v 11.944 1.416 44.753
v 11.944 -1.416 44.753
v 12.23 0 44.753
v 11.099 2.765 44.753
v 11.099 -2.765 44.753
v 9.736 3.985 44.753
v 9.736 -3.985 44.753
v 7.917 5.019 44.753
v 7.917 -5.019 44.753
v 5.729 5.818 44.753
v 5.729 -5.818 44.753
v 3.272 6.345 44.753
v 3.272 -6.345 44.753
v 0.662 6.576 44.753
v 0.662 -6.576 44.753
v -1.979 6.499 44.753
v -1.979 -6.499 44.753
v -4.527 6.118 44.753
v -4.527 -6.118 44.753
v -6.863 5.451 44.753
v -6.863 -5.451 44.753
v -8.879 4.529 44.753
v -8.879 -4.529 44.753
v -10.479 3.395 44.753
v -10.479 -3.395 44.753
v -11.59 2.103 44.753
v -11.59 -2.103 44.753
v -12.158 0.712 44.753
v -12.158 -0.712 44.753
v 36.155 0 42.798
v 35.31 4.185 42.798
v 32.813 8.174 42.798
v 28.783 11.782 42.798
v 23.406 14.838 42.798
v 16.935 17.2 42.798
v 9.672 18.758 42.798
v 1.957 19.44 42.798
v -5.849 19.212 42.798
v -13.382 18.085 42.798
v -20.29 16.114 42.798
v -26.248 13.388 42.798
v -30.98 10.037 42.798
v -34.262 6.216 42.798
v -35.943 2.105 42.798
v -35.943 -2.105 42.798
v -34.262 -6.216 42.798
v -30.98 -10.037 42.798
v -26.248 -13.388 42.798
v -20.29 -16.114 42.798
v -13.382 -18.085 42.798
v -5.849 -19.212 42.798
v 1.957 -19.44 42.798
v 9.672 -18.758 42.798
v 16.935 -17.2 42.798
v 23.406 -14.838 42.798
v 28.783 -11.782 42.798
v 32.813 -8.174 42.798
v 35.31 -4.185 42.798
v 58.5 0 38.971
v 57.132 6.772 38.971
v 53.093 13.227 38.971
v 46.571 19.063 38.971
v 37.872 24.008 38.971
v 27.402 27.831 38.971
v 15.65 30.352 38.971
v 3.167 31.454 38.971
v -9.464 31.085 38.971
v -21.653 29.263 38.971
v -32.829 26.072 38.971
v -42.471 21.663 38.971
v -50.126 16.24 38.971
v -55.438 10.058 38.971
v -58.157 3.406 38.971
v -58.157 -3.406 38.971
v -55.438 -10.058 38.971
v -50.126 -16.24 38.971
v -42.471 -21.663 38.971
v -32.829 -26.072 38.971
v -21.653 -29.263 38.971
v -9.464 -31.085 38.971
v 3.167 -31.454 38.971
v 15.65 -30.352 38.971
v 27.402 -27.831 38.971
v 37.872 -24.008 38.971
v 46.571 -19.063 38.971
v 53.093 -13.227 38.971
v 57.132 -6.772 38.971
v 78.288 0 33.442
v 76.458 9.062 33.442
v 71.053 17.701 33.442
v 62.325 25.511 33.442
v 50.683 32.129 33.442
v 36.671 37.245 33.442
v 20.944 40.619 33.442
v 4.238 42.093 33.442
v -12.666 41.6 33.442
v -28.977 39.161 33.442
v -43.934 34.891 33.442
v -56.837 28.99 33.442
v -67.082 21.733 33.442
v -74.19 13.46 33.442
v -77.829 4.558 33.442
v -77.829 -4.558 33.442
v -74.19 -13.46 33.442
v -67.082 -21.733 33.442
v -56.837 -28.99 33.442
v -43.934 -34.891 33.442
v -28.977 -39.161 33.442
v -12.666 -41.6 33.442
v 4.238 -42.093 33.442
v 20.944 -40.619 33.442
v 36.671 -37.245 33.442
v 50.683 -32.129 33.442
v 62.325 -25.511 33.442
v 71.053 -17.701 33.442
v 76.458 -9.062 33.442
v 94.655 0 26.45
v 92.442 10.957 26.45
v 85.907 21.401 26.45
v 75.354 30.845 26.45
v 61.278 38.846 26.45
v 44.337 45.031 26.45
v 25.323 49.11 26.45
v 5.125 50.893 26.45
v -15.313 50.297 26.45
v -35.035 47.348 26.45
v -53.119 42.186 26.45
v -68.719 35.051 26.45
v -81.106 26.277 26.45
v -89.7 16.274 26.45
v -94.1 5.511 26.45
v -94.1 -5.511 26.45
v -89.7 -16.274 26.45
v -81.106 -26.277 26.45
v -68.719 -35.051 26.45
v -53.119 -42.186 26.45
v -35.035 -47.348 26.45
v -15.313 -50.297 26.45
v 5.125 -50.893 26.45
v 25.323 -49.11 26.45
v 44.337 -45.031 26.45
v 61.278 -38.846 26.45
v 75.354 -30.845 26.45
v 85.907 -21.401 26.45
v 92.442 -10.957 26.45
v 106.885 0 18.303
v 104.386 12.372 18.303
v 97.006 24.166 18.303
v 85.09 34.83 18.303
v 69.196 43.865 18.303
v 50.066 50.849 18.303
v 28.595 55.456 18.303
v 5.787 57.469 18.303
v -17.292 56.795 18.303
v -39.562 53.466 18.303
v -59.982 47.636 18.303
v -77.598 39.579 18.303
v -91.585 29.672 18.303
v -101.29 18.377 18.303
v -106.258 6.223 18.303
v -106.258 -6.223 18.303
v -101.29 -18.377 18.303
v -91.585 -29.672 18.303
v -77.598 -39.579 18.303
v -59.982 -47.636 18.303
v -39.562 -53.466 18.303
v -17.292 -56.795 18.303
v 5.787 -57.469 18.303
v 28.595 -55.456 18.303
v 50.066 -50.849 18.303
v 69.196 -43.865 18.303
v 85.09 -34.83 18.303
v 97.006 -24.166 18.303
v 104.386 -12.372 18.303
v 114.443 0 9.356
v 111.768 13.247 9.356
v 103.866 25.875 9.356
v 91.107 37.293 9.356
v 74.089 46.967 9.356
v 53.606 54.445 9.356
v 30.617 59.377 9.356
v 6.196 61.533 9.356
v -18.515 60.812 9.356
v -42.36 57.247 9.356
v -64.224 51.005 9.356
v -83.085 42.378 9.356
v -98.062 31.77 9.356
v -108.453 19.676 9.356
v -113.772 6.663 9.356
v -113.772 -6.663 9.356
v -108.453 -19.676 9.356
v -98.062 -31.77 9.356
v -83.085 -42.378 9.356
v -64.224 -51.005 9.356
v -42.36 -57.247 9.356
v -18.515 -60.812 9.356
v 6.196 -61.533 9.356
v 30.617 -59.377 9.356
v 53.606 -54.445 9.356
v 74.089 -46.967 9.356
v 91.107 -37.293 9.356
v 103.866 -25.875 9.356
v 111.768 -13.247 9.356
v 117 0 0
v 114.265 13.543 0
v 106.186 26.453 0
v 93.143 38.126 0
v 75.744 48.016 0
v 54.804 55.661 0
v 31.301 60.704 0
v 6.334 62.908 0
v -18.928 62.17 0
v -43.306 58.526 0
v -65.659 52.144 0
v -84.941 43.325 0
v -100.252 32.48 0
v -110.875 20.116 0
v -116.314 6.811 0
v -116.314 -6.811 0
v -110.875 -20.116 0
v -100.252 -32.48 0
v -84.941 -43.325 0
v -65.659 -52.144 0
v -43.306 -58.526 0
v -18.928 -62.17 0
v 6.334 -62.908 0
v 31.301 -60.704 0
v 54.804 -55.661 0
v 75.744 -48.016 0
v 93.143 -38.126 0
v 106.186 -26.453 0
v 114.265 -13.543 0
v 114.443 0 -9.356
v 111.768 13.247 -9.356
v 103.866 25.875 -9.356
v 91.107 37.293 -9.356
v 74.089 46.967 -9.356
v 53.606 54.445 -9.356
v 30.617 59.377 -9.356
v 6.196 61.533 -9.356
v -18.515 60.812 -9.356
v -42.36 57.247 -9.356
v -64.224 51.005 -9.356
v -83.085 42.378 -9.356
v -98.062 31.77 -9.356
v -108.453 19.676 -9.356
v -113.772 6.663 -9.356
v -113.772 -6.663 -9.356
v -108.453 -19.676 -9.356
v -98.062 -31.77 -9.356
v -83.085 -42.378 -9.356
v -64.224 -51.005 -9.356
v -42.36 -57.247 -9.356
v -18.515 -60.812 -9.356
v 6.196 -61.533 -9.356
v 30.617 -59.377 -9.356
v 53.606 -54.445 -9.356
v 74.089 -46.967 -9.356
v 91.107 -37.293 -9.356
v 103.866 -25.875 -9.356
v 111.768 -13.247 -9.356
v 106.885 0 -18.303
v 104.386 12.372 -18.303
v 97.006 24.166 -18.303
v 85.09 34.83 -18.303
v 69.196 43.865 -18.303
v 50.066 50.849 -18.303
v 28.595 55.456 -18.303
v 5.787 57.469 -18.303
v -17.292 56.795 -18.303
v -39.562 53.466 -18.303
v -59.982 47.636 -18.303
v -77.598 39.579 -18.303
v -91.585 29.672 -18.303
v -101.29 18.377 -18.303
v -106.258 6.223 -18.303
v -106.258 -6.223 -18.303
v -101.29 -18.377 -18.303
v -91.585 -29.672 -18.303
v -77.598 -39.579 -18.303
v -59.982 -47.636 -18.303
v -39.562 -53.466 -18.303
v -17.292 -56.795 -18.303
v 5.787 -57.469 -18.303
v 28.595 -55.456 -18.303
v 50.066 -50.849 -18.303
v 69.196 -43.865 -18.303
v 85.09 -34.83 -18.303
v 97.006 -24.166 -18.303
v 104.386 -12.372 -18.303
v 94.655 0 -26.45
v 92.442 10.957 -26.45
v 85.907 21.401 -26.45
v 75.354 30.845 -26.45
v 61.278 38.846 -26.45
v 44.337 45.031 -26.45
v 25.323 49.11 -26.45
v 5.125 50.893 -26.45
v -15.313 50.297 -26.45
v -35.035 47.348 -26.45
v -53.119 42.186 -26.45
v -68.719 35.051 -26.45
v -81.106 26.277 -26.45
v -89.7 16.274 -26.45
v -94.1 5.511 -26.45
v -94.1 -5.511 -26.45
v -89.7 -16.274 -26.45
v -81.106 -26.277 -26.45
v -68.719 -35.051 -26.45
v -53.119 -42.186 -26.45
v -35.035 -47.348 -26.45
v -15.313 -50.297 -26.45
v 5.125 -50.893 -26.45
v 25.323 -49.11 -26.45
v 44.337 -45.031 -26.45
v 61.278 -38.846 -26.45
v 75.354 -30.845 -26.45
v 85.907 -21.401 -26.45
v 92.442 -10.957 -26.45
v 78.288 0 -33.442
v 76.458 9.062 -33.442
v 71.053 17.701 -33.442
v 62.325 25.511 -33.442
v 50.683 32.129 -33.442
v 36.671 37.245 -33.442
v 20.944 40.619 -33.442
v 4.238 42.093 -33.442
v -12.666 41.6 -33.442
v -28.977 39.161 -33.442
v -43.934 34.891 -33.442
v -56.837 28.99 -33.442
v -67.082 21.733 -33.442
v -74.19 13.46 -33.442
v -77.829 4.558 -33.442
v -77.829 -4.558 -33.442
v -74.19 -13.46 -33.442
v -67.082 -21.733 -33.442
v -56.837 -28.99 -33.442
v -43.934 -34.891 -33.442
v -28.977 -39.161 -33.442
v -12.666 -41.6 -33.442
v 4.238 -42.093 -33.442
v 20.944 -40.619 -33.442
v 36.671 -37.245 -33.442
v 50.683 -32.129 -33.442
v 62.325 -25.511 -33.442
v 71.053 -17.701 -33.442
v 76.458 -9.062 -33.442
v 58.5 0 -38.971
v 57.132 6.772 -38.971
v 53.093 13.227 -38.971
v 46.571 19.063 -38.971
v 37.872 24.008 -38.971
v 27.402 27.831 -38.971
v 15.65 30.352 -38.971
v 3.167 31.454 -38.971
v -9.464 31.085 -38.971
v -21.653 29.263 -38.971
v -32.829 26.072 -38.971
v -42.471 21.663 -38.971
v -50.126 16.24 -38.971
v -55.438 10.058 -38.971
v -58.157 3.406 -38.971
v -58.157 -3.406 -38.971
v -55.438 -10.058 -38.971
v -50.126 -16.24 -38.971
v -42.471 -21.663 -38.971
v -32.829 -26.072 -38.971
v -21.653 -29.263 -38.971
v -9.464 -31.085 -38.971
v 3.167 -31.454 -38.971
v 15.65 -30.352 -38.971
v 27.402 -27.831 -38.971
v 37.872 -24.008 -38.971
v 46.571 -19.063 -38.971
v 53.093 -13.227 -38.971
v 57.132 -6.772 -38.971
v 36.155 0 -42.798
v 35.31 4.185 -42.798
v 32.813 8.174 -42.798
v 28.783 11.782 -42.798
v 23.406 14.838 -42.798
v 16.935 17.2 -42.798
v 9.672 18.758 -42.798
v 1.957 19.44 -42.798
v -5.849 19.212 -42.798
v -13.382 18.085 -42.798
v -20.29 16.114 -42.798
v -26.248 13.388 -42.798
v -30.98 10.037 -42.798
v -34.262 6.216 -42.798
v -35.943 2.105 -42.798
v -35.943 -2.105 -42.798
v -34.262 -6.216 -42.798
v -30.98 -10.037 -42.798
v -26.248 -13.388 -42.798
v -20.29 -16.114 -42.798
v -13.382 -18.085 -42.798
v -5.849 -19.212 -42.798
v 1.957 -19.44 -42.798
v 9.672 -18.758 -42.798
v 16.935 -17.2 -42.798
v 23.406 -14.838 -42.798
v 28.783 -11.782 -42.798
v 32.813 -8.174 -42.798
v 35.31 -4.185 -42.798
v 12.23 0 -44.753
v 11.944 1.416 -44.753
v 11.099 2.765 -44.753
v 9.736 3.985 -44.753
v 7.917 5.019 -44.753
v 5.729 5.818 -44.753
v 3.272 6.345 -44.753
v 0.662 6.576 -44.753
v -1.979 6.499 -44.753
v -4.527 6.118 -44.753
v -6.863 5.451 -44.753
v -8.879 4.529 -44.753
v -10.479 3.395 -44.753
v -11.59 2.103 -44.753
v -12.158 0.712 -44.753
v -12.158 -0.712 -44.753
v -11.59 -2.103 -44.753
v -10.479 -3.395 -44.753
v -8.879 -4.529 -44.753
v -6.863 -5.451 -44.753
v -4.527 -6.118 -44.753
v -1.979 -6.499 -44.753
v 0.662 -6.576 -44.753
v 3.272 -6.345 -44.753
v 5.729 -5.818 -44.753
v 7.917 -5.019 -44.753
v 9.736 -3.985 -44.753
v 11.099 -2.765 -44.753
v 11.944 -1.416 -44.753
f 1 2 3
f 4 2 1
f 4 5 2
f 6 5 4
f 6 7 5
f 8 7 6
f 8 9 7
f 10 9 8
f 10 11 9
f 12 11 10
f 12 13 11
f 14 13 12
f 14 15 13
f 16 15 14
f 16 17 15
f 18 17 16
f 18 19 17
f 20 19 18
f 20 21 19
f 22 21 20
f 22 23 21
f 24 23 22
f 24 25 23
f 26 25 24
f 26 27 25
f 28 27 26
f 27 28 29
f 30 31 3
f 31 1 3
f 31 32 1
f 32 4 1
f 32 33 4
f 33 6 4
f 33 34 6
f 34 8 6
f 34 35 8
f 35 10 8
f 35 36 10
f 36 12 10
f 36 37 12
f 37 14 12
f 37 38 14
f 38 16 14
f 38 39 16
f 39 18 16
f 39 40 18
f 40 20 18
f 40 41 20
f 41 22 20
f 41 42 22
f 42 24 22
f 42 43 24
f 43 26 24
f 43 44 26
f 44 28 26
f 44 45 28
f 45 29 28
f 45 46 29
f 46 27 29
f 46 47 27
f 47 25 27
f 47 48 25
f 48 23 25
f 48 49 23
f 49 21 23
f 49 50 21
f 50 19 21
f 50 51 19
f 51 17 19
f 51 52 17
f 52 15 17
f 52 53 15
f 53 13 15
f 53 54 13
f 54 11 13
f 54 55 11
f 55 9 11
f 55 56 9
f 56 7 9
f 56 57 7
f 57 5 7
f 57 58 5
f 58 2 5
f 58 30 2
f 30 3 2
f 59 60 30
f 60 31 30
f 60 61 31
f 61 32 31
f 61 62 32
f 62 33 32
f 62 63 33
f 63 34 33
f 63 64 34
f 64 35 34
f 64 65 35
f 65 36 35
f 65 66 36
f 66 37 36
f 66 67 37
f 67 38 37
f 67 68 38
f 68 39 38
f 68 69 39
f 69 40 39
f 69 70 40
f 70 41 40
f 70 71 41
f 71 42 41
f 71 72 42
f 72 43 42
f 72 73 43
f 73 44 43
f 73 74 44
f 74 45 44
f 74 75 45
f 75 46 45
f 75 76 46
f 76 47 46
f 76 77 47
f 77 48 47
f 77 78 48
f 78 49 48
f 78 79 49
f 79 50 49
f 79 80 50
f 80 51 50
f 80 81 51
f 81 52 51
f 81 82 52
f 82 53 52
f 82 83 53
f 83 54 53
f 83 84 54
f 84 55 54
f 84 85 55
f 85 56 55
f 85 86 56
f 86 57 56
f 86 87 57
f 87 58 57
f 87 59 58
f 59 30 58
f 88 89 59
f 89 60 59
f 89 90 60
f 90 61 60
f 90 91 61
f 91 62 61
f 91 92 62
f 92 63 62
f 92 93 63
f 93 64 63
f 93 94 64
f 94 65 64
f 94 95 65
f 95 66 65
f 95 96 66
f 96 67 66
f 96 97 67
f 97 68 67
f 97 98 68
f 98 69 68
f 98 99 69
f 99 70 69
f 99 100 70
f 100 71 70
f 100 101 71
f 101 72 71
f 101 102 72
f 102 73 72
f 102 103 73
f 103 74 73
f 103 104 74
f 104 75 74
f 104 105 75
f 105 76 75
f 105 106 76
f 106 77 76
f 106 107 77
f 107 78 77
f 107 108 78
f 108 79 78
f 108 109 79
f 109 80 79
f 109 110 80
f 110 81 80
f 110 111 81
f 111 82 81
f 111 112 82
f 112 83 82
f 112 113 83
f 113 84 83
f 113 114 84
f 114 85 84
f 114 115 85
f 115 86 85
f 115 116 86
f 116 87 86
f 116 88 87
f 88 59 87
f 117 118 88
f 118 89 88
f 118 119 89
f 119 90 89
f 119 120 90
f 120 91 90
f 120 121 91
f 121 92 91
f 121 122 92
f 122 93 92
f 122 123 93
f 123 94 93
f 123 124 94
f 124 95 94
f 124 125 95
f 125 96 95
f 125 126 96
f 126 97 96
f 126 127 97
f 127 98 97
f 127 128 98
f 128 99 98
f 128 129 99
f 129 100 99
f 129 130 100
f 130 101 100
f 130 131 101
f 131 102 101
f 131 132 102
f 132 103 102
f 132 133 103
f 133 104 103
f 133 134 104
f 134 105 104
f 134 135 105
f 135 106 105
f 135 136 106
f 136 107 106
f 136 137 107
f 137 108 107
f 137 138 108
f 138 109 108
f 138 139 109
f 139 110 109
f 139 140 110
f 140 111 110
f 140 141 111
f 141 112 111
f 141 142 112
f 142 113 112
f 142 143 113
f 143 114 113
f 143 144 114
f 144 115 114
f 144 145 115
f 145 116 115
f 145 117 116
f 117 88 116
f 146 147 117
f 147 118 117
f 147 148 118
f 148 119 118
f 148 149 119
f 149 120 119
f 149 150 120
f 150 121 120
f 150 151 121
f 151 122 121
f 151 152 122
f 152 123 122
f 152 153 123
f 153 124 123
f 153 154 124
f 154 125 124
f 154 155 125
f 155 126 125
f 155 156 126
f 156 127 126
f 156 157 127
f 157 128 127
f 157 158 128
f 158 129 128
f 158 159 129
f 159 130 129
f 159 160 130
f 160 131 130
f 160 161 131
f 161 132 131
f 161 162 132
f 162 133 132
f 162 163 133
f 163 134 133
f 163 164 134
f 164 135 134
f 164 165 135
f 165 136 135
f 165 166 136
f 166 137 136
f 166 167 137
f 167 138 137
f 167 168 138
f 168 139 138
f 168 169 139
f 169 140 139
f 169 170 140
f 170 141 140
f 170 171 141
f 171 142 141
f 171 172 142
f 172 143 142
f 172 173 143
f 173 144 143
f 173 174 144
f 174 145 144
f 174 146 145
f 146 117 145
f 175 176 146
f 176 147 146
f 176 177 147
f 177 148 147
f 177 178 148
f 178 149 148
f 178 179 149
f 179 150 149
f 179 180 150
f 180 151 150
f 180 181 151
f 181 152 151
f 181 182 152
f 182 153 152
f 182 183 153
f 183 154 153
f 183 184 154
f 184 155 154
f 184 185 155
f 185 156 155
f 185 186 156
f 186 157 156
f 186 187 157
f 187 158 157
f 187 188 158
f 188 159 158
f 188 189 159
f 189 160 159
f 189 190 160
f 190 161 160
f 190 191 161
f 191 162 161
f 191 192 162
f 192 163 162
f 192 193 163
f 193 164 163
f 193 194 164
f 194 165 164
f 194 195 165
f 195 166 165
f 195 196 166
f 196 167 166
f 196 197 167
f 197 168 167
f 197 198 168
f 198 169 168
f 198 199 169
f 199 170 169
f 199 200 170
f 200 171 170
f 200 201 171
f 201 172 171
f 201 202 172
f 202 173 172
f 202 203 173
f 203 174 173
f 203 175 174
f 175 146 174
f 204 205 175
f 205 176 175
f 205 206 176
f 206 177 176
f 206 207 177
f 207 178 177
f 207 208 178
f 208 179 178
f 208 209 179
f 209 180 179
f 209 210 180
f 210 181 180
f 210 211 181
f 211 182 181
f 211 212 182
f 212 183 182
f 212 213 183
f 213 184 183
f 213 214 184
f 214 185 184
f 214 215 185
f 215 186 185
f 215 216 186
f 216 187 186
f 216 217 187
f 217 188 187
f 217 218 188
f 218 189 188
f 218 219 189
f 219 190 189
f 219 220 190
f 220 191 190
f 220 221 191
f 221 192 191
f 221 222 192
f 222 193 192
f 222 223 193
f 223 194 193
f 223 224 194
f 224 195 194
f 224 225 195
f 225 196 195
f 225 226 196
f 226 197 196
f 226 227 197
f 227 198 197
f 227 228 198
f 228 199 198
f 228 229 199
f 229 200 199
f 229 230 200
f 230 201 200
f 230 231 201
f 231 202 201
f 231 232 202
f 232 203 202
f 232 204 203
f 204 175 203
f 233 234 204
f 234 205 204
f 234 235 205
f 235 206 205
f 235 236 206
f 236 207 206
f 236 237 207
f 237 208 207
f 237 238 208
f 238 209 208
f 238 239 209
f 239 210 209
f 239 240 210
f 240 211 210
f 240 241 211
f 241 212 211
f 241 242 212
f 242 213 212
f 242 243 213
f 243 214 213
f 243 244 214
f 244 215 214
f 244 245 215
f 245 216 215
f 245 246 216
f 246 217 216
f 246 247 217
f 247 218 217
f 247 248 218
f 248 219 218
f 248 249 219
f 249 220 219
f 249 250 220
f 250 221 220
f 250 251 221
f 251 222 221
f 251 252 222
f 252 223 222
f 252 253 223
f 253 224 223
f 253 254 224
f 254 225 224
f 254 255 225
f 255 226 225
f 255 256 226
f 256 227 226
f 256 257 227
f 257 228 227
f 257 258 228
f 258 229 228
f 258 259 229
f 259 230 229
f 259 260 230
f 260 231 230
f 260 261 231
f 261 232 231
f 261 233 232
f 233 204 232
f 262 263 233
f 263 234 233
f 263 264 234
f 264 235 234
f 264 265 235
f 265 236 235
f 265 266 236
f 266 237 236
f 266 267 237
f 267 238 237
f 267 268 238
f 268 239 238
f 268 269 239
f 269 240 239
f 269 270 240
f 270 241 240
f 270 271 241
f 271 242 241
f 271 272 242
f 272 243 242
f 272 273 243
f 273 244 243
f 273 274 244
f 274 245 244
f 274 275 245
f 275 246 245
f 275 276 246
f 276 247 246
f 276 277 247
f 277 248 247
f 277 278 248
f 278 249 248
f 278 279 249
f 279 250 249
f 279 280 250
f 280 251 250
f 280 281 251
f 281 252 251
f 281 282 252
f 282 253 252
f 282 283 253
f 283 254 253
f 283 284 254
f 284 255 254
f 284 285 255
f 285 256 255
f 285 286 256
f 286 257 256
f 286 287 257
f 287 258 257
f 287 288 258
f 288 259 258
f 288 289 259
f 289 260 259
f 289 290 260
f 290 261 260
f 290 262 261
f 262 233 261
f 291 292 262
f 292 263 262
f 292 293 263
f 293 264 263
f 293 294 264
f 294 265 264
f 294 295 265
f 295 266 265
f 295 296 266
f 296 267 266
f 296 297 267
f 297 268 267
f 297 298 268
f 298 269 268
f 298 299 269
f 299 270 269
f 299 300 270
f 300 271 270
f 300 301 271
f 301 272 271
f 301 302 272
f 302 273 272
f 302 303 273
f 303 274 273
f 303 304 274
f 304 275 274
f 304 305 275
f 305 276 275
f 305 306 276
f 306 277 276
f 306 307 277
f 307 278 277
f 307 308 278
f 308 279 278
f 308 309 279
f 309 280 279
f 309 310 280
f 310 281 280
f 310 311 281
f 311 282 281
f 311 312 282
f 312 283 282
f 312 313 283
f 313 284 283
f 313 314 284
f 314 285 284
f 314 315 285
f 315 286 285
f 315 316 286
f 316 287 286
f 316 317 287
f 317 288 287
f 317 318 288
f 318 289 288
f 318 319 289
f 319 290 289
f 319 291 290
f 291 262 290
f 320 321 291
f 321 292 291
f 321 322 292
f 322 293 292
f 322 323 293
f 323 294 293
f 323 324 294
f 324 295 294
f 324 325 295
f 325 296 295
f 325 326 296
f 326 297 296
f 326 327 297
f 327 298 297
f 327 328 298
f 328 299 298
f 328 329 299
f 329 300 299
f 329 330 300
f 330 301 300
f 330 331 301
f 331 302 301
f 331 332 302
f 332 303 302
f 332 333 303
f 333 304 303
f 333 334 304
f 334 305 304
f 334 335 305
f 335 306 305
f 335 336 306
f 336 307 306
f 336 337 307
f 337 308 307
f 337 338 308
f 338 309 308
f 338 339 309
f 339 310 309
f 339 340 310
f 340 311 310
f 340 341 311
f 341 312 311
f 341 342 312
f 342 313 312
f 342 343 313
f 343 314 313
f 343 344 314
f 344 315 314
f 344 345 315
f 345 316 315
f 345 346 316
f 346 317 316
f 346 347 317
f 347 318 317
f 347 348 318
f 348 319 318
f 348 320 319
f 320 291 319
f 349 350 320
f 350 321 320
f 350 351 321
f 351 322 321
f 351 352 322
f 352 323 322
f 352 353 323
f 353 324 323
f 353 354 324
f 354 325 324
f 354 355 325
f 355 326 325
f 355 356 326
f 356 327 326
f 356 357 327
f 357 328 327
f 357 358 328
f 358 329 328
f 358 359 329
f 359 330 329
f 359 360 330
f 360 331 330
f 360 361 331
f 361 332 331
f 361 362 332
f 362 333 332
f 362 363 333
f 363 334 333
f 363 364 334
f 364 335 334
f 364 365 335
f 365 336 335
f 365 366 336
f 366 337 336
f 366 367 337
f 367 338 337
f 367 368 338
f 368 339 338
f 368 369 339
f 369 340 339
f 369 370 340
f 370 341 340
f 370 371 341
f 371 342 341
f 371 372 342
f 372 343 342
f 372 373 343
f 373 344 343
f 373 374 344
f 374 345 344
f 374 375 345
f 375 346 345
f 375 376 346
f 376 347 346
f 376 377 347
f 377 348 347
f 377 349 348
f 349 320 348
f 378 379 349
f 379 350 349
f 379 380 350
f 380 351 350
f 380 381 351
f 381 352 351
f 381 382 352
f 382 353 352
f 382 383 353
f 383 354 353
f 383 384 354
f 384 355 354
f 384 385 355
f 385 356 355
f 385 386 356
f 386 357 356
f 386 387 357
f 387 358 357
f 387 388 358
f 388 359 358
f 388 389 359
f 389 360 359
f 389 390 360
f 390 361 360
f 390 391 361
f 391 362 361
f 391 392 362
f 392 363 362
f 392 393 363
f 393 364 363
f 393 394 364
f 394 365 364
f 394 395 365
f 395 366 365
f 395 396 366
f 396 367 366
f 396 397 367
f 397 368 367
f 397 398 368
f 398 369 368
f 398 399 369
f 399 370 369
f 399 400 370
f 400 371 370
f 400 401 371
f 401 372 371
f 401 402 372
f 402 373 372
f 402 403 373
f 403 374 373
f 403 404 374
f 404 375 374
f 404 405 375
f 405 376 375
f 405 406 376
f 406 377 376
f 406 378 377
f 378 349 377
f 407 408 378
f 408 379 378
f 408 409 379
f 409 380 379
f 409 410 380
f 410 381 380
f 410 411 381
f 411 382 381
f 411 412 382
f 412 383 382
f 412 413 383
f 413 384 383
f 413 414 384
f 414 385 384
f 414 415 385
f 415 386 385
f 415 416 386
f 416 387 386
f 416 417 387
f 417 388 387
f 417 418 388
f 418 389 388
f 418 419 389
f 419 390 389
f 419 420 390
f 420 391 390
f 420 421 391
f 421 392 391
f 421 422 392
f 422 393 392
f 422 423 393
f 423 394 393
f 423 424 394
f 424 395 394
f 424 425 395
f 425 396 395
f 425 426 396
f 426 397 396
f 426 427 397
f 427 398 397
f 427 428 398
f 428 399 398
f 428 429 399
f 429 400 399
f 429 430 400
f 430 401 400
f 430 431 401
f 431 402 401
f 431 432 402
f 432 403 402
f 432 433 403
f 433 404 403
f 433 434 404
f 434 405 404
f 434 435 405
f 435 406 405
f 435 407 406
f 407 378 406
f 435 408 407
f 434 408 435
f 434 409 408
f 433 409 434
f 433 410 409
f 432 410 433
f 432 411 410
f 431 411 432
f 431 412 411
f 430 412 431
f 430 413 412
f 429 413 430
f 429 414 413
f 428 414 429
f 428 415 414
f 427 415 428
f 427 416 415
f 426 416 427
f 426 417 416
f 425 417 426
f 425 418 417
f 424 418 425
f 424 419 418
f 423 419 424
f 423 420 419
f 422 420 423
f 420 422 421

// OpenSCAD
// Generated by SolidPython 1.0.1 on 2020-07-29 00:46:50


scale(v = [13, 7, 5]) {
	sphere(r = 9);
}
/***********************************************
*********      SolidPython code:      **********
************************************************
 
# import packages: SolidPython
from solid import *
from solid.utils import *
from itertools import chain, combinations, permutations


class Resize:

    def __init__(self, scad_file):
        self.scad_file = scad_file
        #self.scad_file = import_scad(scad_file)
        # cone/cylinder param:
        self.r1 = 0
        self.r2 = 0
        self.h = 0
        # rectangular prism param:
        self.w = 0
        self.l = 0
        # ellipse param:
        self.r = 0

    # import OpenScad code (file name corresponds to shape)


    # classify shape + parameters
    def assign(self, param1, param2, param3):
        if self.scad_file == 'cone.scad':
            self.r1 = param1
            self.r2 = param2
            self.h = param3
        elif self.scad_file == 'cylinder.scad':
            self.r1 = param1
            self.r2 = param2
            self.h = param3
        elif self.scad_file == 'rectangularPrism.scad':
            self.h = param1
            self.l = param2
            self.w = param3
        else:
            self.r = param1
            self.h = param2

    # resize parameters
    def iterate(self):
        x = range(3, 20, 2)
        i = 1
        if self.scad_file == 'cone.scad':
            tempList = list(permutations(x, 2))
            for temp in tempList:
                param1 = temp[0]
                param2 = temp[1]
                filepath = 'produced_scad_files/' + 'cone' + str(param1) + '_' + str(param2) + '_' + '.scad'
                scad_render_to_file(cylinder(h=param1, r1=param2, r2=0), filepath)

        elif self.scad_file == 'cylinder.scad':
            tempList = list(permutations(x, 3))
            for temp in tempList:
                param1 = temp[0]
                param2 = temp[1]
                filepath = 'produced_scad_files/' + 'cylinder' + str(param1) + '_' + str(param2) + '_' + '.scad'
                scad_render_to_file(cylinder(h=param1, r1=param2, r2=param2), filepath)

        elif self.scad_file == 'rectangularPrism.scad':
            tempList = list(permutations(x, 3))
            for temp in tempList:
                param1 = temp[0]
                param2 = temp[1]
                param3 = temp[2]
                filepath = 'produced_scad_files/' + 'rectangularPrism' + str(param1) + '_' + str(param2) + '_' + str(
                    param3) + '.scad'
                scad_render_to_file(cube(size=(param1, param2, param3)), filepath)

        elif self.scad_file == 'ellipse.scad':
            tempList = list(permutations(x, 4))
            for temp in tempList:
                param1 = temp[0]
                param2 = temp[1]
                param3 = temp[2]
                param4 = temp[3]
                filepath = 'produced_scad_files/' + 'ellipse' + str(param1) + '_' + str(param2) + '_' + str(param3) + '_' + str(param4) + '.scad'
                scad_render_to_file(scale([param1, param2, param3])(sphere(r=param4)), filepath)

    def render_to_scadfile(self):
        scad_render_to_file(scad, 'example.scad') 
 
************************************************/
